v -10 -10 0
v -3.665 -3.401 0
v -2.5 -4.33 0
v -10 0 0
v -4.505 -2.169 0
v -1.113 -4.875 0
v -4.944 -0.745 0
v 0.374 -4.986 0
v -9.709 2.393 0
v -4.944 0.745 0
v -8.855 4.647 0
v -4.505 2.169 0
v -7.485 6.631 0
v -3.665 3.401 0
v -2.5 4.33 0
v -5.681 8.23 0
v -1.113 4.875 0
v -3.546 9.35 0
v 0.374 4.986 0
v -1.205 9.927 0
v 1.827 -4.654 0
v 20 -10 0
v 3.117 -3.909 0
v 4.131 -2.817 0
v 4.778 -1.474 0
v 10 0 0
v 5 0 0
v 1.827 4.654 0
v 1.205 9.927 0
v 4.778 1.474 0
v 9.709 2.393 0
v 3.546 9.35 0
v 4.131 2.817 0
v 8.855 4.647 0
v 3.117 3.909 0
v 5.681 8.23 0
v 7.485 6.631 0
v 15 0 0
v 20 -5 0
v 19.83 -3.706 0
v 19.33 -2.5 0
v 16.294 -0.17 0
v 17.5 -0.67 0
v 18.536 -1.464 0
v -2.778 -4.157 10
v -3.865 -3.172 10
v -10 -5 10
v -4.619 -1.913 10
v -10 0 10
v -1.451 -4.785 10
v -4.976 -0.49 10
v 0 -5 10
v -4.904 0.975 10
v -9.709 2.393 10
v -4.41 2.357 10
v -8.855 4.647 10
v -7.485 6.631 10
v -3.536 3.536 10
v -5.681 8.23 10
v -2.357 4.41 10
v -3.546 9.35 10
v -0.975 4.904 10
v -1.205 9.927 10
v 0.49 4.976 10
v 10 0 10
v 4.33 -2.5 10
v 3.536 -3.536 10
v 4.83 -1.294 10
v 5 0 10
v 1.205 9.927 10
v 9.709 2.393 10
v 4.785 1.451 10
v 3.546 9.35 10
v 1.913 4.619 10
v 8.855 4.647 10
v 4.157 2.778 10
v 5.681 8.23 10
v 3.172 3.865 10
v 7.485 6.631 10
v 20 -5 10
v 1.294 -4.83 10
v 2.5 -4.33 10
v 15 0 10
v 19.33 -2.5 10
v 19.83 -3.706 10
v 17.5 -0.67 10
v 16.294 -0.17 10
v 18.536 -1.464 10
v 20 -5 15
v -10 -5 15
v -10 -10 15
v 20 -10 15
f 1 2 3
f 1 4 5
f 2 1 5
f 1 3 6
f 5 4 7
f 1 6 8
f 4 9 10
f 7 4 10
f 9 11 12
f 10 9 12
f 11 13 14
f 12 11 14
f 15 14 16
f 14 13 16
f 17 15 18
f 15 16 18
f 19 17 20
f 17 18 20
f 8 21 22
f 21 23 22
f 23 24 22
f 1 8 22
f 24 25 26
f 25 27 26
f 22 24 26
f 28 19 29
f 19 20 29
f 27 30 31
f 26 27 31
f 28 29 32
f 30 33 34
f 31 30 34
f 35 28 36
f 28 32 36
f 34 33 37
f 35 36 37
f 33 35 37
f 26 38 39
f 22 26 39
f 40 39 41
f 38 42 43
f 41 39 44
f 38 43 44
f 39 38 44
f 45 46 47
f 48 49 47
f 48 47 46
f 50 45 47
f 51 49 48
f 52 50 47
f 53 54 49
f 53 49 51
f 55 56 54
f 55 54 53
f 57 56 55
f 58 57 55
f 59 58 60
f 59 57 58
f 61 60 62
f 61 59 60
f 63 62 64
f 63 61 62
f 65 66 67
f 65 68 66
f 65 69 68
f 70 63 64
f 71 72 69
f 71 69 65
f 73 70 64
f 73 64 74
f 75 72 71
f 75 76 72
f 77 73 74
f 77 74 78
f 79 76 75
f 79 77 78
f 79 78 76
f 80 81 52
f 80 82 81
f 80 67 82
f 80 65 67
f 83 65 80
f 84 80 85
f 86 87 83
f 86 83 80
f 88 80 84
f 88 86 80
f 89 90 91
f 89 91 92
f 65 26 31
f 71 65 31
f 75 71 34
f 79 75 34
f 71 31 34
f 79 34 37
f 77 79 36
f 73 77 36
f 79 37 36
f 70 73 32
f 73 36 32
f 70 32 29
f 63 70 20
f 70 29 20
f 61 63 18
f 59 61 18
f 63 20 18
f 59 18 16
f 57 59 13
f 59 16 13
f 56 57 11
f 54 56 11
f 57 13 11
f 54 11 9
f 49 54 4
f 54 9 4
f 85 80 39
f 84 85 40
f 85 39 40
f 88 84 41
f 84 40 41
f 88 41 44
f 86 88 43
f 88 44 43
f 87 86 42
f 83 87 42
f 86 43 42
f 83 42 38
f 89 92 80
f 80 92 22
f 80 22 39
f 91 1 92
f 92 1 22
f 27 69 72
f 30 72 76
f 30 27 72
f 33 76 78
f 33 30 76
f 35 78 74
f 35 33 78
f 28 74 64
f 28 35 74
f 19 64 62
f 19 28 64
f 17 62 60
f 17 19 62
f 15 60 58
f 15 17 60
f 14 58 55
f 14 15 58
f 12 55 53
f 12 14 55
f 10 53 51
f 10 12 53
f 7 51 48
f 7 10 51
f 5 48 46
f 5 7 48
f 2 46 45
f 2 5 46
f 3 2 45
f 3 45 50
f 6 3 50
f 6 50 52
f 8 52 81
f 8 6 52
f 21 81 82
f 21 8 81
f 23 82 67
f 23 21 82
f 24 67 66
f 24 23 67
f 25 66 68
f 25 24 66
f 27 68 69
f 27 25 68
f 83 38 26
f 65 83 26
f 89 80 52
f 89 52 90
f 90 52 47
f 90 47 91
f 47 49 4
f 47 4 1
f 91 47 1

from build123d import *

# Parameters (mm, degrees)
SKETCH_1_R      = 5
EXTRUDE_1_DEPTH = 10
EXTRUDE_2_DEPTH = 15


with BuildPart() as part:
    # 草圖1 → 填料-伸長1 (new body)
    with BuildSketch(Plane.XY):
        with BuildLine():
            Line((-10, 0), (-10, -10))
            Line((-10, -10), (20, -10))
            Line((20, -10), (20, -5))
            ThreePointArc((20, -5), (18.535533906, -1.464466094), (15, 0))
            Line((15, 0), (10, 0))
            ThreePointArc((10, 0), (0, 10), (-10, 0))
        make_face()
        Circle(SKETCH_1_R, mode=Mode.SUBTRACT)
    extrude(amount=EXTRUDE_1_DEPTH)

    # 草圖1<3> → 填料-伸長2 (add)
    with BuildSketch(Plane.XY):
        Polygon((0, -5), (-10, -5), (-10, -10), (20, -10), (20, -5), align=None)
    extrude(amount=EXTRUDE_2_DEPTH)


solid = part.part
